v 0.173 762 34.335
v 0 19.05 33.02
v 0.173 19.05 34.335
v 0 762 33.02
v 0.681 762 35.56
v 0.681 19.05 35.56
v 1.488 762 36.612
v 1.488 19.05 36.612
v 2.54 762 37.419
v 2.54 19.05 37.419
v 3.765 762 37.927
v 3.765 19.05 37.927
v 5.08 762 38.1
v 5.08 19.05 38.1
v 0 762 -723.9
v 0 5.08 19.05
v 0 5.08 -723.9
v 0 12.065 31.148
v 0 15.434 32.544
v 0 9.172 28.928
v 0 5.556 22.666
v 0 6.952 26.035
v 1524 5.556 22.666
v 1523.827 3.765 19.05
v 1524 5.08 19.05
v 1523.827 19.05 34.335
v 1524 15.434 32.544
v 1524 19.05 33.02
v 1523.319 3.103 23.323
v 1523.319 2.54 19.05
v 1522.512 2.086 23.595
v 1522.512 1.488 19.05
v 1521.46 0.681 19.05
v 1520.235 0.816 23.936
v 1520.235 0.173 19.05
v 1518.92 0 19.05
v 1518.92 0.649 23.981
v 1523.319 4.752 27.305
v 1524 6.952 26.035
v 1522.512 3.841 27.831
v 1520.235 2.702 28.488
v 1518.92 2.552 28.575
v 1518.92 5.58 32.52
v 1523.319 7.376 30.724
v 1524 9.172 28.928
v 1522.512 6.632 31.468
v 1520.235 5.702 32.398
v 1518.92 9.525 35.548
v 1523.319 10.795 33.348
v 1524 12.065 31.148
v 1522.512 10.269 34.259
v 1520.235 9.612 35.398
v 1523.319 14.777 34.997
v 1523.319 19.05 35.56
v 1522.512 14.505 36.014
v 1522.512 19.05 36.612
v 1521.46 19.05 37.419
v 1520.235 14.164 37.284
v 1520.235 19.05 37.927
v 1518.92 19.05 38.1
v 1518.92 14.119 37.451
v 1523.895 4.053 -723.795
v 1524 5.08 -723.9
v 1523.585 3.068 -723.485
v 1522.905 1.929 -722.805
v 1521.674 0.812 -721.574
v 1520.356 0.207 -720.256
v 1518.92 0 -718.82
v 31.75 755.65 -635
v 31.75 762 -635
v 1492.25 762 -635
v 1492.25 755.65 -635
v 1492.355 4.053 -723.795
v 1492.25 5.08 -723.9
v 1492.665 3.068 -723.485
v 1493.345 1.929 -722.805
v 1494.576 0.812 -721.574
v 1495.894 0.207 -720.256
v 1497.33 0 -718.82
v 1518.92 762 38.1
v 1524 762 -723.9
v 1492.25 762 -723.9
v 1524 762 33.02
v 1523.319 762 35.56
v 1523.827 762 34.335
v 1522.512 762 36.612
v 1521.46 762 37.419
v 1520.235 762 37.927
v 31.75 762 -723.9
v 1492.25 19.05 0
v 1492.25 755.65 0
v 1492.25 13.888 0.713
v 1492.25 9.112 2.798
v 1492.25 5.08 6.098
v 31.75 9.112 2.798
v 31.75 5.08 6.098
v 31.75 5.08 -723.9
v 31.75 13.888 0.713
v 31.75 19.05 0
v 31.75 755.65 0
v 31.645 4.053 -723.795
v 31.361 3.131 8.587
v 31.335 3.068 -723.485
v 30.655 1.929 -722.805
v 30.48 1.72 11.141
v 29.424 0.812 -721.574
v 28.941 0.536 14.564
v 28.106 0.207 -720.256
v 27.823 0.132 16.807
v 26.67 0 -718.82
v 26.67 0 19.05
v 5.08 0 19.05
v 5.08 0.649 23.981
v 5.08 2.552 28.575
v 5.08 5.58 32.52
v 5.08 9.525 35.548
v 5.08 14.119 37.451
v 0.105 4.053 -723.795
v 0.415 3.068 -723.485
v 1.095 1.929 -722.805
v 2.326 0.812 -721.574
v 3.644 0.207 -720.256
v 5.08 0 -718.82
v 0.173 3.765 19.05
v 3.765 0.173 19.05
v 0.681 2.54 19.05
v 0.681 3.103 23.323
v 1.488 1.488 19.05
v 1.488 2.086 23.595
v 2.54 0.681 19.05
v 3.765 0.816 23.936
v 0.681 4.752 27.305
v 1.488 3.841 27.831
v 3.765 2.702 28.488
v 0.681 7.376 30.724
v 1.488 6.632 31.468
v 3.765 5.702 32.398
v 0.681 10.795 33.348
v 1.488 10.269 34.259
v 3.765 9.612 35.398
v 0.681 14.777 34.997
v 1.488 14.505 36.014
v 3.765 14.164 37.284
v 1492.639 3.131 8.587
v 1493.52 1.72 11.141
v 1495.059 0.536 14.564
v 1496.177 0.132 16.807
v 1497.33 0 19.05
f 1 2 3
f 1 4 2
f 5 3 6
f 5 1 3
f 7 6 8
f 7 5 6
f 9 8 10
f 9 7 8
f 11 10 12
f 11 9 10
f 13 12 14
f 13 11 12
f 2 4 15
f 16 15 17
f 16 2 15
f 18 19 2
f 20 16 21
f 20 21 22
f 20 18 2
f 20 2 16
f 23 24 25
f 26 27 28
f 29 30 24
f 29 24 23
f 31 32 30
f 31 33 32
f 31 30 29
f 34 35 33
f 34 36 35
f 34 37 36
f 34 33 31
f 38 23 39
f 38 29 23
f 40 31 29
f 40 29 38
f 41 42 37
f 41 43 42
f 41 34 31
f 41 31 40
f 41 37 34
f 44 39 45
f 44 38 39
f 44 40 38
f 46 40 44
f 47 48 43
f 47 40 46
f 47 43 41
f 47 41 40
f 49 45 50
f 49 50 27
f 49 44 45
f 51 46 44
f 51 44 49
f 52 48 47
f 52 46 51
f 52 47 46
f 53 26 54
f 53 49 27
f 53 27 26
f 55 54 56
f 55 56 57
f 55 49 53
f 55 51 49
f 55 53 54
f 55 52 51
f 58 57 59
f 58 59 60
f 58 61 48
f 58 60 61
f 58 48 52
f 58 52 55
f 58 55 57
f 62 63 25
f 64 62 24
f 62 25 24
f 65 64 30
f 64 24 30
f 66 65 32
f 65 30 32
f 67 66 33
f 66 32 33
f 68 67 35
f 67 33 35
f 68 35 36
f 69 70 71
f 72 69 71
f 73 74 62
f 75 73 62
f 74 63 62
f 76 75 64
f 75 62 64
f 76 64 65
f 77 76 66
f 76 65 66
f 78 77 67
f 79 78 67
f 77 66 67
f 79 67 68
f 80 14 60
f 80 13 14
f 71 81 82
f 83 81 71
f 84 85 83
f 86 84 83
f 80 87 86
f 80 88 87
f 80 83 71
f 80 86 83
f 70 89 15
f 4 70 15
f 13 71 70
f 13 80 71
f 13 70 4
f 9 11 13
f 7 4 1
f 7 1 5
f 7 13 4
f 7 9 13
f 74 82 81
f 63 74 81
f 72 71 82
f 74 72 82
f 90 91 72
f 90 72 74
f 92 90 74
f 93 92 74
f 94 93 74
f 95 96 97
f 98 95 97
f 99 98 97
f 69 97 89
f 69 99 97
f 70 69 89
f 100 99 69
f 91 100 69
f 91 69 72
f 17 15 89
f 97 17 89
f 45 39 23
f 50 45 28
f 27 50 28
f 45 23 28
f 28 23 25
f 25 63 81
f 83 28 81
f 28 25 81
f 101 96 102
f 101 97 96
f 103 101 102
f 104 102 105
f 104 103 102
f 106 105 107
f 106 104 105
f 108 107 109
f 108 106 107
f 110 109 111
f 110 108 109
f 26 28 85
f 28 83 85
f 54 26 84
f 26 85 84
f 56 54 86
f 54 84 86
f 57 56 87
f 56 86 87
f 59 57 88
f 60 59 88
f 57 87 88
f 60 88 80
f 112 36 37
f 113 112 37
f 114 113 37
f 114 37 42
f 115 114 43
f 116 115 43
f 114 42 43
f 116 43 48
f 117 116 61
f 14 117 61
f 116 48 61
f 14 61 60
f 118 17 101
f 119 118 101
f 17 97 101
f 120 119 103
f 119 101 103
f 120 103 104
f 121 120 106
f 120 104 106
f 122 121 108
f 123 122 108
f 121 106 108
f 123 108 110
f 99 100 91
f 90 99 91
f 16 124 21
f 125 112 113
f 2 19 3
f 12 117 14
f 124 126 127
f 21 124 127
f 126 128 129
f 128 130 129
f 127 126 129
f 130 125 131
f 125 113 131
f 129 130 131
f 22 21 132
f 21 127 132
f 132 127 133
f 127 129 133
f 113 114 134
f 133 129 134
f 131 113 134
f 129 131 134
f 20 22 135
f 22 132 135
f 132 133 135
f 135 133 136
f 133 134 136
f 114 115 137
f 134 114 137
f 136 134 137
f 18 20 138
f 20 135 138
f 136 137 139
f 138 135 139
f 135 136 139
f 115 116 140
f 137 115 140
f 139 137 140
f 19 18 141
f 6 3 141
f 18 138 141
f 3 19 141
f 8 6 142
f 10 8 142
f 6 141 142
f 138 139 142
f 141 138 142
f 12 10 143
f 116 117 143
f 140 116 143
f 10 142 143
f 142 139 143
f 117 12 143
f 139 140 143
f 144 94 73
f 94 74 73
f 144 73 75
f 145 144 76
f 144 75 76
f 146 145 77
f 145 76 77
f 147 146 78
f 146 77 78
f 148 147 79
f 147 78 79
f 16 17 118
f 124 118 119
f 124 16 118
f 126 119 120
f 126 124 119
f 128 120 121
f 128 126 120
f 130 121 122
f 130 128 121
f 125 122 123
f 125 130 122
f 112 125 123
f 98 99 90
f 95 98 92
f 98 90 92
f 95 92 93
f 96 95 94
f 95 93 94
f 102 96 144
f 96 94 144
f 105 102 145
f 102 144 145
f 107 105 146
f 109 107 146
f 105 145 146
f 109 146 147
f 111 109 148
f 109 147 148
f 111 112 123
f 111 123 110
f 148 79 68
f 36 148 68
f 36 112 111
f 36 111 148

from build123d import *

# Parameters (mm, degrees)
F0_W     = 1460.5
F0_H     = 755.65
F0_H_2   = 6.35
F1_DEPTH = 38.1
F2_DEPTH = 723.9
F3_DEPTH = 635
F4_R     = 19.04999
F5_R     = 5.08


# Not quite as in the source:
# - a fillet or chamfer is up to 0.001 mm smaller than in the source, because OpenCascade refuses the exact size


with BuildPart() as f1:
    # F0 (on Top) → F1 (new body)
    with BuildSketch(Plane.XY):
        with Locations((762, 377.825)):
            Rectangle(F0_W, F0_H)
        Polygon((0, 762), (0, 0), (31.75, 0), (31.75, 755.65), (31.75, 762), align=None)
        with Locations((762, 758.825)):
            Rectangle(F0_W, F0_H_2)
        Polygon((1492.25, 755.65), (1492.25, 0), (1524, 0), (1524, 762), (1492.25, 762), align=None)
    extrude(amount=F1_DEPTH)

    # F0 (on Top) → F2 (join)
    with BuildSketch(Plane.XY):
        Polygon((0, 762), (0, 0), (31.75, 0), (31.75, 755.65), (31.75, 762), align=None)
        Polygon((1492.25, 755.65), (1492.25, 0), (1524, 0), (1524, 762), (1492.25, 762), align=None)
    extrude(amount=-F2_DEPTH)

    # F0 (on Top) → F3 (join)
    with BuildSketch(Plane.XY):
        with Locations((762, 758.825)):
            Rectangle(F0_W, F0_H_2)
    extrude(amount=-F3_DEPTH)

    # F4 (radius 19.05 in the source; OpenCascade refuses exactly that, so slightly less here)
    f4_edges = [f1.edges().sort_by_distance(p)[0] for p in [
        (762, 0, 38.1),
        (762, 0, 0),
    ]]
    fillet(f4_edges, radius=F4_R)

    # F5
    f5_edges = [f1.edges().sort_by_distance(p)[0] for p in [
        (1524, 0, -352.424995),
        (762, 0, 19.05001),
        (1508.125, 0, -723.9),
        (0, 0, -352.424995),
        (1492.25, 0, -361.95),
        (15.875, 0, -723.9),
        (1492.25, 0, 9.524995),
        (31.75, 0, -361.95),
        (762, 0, 19.04999),
        (31.75, 0, 9.524995),
    ]]
    fillet(f5_edges, radius=F5_R)


solid = f1.part
